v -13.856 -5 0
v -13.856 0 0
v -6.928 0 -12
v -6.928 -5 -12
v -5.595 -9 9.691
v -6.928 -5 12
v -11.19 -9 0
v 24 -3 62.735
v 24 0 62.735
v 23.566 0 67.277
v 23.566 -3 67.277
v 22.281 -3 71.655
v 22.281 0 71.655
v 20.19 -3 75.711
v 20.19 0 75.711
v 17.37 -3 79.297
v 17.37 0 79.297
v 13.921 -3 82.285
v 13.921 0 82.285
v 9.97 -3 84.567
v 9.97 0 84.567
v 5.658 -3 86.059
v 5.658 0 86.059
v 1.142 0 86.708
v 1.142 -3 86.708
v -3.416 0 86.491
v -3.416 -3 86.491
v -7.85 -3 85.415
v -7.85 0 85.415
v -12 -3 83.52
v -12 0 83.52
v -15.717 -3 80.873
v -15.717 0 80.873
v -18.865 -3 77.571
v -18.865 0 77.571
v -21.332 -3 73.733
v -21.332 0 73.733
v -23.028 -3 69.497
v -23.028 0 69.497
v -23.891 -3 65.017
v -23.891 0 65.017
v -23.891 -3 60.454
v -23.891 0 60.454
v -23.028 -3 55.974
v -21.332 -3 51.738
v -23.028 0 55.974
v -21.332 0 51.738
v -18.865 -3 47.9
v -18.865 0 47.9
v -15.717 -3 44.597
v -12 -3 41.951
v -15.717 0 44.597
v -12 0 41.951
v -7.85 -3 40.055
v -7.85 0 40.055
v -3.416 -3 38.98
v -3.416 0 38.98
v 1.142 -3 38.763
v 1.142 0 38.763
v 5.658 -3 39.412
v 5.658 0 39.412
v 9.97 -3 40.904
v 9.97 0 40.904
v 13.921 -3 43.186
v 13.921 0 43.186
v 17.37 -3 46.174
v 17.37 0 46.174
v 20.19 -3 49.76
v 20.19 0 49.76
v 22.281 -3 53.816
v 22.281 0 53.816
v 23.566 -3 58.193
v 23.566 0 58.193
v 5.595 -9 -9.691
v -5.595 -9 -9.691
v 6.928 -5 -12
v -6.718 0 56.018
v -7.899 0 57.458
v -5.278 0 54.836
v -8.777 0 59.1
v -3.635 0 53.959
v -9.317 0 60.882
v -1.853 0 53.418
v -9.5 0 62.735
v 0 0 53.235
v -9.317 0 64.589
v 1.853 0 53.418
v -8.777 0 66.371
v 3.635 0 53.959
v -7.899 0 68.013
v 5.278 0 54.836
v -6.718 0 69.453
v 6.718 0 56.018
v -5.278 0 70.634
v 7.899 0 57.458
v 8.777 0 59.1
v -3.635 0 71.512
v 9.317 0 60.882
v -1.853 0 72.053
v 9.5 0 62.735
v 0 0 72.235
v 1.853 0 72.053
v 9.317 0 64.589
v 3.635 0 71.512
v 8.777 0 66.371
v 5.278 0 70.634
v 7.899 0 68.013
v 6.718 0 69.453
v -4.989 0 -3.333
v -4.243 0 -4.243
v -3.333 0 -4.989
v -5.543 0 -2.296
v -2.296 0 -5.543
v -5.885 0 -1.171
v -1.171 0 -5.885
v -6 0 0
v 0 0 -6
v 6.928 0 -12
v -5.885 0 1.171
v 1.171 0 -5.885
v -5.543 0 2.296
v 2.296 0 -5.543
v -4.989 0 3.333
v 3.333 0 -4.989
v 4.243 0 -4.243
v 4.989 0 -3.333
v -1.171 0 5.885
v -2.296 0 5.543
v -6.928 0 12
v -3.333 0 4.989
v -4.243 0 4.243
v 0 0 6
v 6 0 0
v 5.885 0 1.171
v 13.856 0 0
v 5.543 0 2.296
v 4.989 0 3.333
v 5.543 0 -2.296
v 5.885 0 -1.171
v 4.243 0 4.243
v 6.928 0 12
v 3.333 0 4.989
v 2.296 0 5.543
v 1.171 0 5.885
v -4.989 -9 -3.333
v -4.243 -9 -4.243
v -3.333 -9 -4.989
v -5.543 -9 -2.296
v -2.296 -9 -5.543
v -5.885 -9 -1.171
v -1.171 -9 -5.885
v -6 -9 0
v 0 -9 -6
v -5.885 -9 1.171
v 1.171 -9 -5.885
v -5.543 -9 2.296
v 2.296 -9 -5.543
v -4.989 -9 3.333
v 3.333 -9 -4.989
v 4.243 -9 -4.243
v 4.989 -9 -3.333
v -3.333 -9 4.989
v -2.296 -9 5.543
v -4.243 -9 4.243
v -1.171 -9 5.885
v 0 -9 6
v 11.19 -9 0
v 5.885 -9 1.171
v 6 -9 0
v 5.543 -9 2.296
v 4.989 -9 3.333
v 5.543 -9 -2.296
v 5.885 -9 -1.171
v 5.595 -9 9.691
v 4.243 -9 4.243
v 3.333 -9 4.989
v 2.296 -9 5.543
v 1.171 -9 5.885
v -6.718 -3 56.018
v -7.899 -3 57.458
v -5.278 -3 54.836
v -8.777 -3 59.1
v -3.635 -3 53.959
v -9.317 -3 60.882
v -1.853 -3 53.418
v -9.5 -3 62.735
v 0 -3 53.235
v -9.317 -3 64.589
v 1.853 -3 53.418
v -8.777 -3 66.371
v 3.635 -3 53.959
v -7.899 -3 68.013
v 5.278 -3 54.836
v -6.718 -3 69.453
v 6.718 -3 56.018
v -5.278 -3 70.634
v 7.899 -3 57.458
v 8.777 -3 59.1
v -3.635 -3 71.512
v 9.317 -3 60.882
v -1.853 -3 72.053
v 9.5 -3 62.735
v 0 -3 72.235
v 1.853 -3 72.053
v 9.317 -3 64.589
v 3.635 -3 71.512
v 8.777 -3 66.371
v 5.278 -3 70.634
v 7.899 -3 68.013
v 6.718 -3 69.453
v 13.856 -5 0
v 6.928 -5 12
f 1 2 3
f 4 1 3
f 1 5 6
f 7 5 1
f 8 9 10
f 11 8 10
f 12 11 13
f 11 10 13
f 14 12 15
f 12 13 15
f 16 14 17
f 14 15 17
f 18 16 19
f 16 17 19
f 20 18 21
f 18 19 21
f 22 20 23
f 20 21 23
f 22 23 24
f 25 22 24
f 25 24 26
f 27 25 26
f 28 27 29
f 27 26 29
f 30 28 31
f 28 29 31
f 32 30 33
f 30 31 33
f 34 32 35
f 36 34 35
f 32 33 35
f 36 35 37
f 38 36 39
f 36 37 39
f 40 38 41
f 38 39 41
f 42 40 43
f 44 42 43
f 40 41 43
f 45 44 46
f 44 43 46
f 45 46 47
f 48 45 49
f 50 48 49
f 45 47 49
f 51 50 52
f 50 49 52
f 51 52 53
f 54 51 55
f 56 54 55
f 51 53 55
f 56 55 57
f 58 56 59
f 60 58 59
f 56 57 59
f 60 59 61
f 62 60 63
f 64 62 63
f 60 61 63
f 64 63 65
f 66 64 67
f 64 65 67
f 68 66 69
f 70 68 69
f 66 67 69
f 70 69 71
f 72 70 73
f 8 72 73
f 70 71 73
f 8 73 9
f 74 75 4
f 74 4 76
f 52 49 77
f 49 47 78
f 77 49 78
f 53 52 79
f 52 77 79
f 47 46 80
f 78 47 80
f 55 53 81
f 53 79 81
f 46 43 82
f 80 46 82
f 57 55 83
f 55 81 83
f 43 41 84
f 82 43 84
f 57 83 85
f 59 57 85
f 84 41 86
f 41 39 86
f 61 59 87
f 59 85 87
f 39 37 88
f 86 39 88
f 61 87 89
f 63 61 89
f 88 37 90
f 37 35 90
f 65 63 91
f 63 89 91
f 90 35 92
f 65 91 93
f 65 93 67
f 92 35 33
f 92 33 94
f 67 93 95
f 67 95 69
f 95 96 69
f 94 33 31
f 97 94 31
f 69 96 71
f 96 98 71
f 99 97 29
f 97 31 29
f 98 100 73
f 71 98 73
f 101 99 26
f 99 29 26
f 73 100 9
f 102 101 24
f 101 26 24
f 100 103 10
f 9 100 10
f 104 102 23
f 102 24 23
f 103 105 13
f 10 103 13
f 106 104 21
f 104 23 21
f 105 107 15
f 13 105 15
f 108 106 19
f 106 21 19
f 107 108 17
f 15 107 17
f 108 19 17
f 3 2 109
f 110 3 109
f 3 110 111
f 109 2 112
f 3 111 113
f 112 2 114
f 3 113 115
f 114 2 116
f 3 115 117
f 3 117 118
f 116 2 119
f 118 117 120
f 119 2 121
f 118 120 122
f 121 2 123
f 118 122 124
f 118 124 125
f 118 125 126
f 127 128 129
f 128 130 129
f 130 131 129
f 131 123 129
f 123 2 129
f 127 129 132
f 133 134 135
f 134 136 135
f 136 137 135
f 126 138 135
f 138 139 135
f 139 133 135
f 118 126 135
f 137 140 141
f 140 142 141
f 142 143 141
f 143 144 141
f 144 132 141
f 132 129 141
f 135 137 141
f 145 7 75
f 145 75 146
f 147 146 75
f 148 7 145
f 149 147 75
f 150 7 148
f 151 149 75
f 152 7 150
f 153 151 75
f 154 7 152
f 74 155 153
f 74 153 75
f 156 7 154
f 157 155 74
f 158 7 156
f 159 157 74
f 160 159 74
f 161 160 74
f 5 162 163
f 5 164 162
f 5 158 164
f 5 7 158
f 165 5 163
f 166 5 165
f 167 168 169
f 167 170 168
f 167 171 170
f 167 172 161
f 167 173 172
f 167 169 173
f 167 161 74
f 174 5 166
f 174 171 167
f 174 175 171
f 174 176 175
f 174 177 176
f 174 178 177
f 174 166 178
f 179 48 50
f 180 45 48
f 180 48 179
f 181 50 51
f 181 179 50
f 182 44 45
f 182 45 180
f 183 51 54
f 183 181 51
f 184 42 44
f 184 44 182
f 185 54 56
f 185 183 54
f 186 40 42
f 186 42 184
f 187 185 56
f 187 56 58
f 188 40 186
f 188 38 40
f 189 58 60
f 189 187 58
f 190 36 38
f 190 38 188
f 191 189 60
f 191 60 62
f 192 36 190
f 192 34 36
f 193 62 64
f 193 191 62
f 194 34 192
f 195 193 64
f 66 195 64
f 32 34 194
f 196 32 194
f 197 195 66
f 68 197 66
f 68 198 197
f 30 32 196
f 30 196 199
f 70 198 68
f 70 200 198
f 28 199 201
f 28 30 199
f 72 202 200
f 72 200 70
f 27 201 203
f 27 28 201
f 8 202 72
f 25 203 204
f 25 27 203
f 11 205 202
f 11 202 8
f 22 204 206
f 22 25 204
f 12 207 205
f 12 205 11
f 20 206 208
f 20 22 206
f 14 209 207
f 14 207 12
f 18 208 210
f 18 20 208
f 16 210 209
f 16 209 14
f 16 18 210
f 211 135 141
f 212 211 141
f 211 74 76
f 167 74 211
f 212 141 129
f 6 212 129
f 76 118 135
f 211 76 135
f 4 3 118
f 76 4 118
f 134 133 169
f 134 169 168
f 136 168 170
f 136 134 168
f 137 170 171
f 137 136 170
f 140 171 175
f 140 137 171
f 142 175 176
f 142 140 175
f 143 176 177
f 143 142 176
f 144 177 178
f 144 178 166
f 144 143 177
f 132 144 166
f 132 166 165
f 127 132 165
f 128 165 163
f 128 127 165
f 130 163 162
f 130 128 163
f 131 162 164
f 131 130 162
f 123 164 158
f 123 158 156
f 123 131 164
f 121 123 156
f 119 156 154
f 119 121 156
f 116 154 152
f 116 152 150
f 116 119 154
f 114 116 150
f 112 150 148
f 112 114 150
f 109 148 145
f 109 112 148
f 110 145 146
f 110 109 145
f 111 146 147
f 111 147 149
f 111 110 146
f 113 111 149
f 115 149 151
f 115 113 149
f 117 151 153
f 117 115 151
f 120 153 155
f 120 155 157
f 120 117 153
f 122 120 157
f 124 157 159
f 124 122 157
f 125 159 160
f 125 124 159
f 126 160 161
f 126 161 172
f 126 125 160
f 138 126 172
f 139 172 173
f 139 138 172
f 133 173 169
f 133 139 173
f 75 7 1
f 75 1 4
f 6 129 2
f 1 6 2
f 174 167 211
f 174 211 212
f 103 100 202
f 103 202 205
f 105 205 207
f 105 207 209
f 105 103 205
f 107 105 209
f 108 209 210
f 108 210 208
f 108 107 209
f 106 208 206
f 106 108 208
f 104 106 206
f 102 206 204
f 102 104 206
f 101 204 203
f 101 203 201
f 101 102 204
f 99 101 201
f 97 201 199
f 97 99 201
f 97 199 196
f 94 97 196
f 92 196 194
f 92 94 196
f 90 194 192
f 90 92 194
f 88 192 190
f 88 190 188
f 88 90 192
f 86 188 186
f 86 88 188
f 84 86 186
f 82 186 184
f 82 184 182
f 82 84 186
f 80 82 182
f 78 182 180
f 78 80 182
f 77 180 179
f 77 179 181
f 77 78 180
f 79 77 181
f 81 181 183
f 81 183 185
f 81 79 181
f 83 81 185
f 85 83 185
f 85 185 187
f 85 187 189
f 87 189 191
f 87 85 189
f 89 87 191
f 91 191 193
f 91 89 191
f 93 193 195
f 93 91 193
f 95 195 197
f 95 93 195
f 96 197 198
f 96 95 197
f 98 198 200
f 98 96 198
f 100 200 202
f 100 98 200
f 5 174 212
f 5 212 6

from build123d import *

# Parameters (mm, degrees)
F0_R     = 6
F1_DEPTH = 9
F2_R     = 24
F2_R_2   = 9.5
F3_DEPTH = 3
F4_SIZE2 = 2.309401
F4_SIZE  = 4


with BuildPart() as f1:
    # F0 (on Front) → F1 (new body)
    with BuildSketch(Plane.XZ):
        Polygon((6.928203, 12), (-6.928203, 12), (-13.856406, 0), (-6.928203, -12), (6.928203, -12), (13.856406, 0), align=None)
        Circle(F0_R, mode=Mode.SUBTRACT)
    extrude(amount=F1_DEPTH)

    # F4
    f4_edges = [f1.edges().sort_by_distance(p)[0] for p in [
        (-10.392305, -9, -6),
        (0, -9, -12),
        (10.392305, -9, -6),
        (10.392305, -9, 6),
        (0, -9, 12),
        (-10.392305, -9, 6),
    ]]
    chamfer(f4_edges, length=F4_SIZE, length2=F4_SIZE2)


with BuildPart() as f3:
    # F2 (on Front) → F3 (new body)
    with BuildSketch(Plane.XZ):
        with Locations((0, 62.735419)):
            Circle(F2_R)
        with Locations((0, 62.735419)):
            Circle(F2_R_2, mode=Mode.SUBTRACT)
    extrude(amount=F3_DEPTH)


solid = Compound([f1.part, f3.part])
